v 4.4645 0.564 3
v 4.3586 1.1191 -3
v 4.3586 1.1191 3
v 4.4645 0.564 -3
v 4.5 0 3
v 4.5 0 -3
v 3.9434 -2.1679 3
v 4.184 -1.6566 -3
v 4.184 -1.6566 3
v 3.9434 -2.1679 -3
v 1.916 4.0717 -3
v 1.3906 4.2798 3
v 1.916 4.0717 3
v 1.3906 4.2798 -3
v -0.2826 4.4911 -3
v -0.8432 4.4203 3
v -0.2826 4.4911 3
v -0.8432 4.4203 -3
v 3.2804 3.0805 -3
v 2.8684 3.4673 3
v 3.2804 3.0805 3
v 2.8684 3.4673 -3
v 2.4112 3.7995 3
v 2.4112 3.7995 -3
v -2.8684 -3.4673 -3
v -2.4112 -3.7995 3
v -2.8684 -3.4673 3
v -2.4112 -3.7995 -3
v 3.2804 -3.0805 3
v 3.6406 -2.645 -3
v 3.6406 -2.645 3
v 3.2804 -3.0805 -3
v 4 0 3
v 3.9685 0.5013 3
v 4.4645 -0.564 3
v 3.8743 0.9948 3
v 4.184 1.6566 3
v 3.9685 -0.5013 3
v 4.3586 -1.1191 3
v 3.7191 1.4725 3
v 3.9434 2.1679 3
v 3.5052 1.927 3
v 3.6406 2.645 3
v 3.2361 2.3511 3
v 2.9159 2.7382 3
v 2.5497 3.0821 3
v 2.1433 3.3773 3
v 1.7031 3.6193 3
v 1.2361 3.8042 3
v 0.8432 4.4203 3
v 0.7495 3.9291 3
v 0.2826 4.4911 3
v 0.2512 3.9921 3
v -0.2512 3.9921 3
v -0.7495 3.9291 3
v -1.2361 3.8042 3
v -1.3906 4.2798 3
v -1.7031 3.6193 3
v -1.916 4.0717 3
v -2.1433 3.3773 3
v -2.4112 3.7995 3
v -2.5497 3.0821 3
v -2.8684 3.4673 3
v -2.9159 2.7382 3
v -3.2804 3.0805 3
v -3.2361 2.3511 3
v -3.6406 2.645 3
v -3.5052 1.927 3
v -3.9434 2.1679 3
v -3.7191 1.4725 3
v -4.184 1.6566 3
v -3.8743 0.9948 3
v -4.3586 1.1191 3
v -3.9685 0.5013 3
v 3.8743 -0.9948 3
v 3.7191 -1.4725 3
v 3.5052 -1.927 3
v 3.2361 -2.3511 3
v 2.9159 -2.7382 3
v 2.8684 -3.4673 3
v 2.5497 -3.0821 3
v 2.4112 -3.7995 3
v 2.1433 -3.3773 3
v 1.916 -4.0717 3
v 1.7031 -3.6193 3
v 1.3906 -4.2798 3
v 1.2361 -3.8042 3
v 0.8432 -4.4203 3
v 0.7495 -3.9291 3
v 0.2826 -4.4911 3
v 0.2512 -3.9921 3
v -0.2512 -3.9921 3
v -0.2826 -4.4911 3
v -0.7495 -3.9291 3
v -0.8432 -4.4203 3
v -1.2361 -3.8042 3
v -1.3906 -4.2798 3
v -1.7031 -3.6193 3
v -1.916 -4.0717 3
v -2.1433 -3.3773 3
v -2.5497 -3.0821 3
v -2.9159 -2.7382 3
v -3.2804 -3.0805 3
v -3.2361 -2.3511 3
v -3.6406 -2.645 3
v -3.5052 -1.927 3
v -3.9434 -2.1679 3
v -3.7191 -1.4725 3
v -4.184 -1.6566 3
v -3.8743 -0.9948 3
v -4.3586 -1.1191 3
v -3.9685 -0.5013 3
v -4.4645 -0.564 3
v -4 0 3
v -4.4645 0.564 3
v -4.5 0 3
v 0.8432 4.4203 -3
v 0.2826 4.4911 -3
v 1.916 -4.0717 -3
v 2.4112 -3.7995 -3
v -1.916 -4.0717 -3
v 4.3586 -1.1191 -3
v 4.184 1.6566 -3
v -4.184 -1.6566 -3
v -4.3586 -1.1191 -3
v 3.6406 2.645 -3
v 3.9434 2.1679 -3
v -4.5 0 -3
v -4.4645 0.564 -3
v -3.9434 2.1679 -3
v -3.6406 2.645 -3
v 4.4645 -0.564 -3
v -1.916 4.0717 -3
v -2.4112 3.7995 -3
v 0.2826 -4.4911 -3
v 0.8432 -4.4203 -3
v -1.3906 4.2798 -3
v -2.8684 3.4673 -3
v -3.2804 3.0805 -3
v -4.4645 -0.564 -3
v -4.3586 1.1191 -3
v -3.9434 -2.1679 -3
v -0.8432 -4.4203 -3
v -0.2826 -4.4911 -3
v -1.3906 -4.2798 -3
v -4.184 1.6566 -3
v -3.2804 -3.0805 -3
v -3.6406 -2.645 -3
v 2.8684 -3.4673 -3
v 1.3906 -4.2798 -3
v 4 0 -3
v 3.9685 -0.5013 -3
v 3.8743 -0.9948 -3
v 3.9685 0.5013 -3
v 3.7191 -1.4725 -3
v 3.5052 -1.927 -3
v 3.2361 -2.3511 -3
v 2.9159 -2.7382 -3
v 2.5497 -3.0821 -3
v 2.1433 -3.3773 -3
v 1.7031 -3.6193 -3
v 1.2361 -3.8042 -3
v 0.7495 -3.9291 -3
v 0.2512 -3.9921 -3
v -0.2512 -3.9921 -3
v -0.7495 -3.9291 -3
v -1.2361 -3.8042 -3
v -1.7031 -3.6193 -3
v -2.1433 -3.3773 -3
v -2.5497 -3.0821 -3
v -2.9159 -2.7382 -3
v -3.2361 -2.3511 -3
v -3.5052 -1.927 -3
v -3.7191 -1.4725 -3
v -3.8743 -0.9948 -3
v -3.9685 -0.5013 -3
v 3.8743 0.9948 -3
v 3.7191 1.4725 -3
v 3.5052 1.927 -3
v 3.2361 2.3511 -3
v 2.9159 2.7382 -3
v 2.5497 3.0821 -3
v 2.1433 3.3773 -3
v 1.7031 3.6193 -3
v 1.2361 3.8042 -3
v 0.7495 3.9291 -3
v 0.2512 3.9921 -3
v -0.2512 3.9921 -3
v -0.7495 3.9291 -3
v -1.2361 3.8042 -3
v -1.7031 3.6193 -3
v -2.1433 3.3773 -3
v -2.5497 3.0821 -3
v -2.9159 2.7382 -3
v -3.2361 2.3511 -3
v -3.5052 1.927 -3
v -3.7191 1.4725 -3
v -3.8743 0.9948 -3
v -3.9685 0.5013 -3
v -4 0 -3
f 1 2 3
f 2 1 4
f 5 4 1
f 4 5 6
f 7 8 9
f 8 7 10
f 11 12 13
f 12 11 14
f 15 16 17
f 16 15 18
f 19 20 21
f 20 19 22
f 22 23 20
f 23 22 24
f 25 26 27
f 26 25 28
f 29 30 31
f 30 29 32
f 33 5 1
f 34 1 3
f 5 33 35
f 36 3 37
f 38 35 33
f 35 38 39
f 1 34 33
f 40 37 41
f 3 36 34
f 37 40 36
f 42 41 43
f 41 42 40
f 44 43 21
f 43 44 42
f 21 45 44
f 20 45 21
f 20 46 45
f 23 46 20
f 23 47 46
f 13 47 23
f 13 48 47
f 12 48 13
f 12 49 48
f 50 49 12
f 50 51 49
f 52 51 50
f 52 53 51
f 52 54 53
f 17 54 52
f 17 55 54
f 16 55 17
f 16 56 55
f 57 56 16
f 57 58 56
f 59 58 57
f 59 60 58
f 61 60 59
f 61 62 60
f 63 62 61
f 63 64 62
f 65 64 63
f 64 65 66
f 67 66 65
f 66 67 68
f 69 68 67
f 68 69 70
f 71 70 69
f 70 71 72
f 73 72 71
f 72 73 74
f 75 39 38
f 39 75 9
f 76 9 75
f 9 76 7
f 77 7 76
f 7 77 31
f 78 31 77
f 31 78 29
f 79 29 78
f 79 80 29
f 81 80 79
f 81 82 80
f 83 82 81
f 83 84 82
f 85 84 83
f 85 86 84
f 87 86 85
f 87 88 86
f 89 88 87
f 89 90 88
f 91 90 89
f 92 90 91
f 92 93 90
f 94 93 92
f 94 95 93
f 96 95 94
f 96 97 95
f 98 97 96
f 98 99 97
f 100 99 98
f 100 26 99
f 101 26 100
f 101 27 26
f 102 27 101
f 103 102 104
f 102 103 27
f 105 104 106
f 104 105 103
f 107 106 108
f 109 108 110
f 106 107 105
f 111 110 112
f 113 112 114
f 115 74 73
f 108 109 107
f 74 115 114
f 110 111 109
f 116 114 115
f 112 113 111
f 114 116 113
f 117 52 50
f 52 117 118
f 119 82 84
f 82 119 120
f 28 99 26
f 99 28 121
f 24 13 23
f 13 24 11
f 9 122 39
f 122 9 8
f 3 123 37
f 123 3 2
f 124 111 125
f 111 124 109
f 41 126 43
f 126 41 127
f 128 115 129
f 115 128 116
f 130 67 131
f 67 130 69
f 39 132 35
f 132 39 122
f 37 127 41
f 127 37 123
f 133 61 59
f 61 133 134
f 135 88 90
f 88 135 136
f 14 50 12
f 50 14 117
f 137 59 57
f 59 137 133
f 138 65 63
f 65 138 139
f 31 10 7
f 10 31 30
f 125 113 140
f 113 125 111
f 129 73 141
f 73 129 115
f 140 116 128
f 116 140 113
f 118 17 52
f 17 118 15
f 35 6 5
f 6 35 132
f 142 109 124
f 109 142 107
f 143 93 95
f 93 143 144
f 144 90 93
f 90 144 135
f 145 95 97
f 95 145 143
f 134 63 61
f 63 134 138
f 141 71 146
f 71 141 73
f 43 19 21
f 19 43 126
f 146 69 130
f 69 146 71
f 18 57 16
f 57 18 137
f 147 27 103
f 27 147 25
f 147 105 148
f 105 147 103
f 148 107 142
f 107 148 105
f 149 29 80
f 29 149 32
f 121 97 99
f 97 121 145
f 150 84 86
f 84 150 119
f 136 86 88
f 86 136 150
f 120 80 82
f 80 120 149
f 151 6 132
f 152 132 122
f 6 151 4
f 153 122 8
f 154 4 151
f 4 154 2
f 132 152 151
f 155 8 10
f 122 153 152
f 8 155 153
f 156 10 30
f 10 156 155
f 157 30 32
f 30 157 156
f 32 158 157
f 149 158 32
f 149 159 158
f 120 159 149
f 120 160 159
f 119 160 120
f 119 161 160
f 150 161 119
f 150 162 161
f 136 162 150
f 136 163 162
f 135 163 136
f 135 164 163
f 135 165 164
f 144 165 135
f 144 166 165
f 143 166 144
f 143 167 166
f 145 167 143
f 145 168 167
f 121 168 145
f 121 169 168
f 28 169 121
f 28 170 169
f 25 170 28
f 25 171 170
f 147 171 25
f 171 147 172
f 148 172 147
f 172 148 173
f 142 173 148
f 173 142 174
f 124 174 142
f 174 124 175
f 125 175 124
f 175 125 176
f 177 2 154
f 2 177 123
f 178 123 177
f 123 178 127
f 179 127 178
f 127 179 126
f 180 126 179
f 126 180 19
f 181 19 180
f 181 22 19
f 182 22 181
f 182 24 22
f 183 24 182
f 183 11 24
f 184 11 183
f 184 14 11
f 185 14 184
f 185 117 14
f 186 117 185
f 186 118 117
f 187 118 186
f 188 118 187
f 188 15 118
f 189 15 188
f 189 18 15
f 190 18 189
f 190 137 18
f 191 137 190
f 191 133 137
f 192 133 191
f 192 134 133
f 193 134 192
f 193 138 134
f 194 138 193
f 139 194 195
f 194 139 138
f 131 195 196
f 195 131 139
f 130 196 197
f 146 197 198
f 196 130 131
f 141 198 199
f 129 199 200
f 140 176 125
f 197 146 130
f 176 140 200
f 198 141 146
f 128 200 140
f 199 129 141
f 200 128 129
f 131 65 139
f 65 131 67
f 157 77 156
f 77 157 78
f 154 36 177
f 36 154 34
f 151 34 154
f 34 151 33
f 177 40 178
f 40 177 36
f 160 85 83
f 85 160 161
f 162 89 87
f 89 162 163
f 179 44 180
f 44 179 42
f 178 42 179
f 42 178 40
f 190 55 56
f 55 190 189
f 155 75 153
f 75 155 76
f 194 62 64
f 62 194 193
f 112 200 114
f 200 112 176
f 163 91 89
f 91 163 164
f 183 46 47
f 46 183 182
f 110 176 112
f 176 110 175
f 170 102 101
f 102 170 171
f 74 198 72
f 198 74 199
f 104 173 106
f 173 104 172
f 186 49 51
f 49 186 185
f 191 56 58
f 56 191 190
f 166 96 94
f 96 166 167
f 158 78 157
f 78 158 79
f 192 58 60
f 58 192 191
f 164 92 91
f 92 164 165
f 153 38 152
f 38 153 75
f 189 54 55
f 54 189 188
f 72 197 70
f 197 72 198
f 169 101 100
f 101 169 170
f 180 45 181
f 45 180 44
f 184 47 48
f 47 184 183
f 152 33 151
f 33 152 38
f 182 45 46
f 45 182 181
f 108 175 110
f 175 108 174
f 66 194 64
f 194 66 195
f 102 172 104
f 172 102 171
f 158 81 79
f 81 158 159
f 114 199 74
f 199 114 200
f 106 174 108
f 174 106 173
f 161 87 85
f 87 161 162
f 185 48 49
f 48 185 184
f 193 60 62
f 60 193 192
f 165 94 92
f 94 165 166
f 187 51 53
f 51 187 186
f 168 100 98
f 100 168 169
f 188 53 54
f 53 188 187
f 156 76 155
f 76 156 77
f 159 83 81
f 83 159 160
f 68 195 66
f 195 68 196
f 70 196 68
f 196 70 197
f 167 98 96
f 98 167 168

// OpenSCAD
$fn = 50;


difference() {
	union() {
		translate(v = [0, 0, -3.0000000000]) {
			cylinder(h = 6, r = 4.5000000000);
		}
	}
	union() {
		translate(v = [0, 0, -100.0000000000]) {
			cylinder(h = 200, r = 4.0000000000);
		}
	}
}
